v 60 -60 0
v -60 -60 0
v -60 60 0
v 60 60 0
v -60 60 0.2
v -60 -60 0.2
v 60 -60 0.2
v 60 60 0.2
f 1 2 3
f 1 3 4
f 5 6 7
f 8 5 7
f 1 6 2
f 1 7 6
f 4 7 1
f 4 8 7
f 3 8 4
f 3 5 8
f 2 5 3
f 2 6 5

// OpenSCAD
linear_extrude(0.2) {
        square(120, center = true);
}
